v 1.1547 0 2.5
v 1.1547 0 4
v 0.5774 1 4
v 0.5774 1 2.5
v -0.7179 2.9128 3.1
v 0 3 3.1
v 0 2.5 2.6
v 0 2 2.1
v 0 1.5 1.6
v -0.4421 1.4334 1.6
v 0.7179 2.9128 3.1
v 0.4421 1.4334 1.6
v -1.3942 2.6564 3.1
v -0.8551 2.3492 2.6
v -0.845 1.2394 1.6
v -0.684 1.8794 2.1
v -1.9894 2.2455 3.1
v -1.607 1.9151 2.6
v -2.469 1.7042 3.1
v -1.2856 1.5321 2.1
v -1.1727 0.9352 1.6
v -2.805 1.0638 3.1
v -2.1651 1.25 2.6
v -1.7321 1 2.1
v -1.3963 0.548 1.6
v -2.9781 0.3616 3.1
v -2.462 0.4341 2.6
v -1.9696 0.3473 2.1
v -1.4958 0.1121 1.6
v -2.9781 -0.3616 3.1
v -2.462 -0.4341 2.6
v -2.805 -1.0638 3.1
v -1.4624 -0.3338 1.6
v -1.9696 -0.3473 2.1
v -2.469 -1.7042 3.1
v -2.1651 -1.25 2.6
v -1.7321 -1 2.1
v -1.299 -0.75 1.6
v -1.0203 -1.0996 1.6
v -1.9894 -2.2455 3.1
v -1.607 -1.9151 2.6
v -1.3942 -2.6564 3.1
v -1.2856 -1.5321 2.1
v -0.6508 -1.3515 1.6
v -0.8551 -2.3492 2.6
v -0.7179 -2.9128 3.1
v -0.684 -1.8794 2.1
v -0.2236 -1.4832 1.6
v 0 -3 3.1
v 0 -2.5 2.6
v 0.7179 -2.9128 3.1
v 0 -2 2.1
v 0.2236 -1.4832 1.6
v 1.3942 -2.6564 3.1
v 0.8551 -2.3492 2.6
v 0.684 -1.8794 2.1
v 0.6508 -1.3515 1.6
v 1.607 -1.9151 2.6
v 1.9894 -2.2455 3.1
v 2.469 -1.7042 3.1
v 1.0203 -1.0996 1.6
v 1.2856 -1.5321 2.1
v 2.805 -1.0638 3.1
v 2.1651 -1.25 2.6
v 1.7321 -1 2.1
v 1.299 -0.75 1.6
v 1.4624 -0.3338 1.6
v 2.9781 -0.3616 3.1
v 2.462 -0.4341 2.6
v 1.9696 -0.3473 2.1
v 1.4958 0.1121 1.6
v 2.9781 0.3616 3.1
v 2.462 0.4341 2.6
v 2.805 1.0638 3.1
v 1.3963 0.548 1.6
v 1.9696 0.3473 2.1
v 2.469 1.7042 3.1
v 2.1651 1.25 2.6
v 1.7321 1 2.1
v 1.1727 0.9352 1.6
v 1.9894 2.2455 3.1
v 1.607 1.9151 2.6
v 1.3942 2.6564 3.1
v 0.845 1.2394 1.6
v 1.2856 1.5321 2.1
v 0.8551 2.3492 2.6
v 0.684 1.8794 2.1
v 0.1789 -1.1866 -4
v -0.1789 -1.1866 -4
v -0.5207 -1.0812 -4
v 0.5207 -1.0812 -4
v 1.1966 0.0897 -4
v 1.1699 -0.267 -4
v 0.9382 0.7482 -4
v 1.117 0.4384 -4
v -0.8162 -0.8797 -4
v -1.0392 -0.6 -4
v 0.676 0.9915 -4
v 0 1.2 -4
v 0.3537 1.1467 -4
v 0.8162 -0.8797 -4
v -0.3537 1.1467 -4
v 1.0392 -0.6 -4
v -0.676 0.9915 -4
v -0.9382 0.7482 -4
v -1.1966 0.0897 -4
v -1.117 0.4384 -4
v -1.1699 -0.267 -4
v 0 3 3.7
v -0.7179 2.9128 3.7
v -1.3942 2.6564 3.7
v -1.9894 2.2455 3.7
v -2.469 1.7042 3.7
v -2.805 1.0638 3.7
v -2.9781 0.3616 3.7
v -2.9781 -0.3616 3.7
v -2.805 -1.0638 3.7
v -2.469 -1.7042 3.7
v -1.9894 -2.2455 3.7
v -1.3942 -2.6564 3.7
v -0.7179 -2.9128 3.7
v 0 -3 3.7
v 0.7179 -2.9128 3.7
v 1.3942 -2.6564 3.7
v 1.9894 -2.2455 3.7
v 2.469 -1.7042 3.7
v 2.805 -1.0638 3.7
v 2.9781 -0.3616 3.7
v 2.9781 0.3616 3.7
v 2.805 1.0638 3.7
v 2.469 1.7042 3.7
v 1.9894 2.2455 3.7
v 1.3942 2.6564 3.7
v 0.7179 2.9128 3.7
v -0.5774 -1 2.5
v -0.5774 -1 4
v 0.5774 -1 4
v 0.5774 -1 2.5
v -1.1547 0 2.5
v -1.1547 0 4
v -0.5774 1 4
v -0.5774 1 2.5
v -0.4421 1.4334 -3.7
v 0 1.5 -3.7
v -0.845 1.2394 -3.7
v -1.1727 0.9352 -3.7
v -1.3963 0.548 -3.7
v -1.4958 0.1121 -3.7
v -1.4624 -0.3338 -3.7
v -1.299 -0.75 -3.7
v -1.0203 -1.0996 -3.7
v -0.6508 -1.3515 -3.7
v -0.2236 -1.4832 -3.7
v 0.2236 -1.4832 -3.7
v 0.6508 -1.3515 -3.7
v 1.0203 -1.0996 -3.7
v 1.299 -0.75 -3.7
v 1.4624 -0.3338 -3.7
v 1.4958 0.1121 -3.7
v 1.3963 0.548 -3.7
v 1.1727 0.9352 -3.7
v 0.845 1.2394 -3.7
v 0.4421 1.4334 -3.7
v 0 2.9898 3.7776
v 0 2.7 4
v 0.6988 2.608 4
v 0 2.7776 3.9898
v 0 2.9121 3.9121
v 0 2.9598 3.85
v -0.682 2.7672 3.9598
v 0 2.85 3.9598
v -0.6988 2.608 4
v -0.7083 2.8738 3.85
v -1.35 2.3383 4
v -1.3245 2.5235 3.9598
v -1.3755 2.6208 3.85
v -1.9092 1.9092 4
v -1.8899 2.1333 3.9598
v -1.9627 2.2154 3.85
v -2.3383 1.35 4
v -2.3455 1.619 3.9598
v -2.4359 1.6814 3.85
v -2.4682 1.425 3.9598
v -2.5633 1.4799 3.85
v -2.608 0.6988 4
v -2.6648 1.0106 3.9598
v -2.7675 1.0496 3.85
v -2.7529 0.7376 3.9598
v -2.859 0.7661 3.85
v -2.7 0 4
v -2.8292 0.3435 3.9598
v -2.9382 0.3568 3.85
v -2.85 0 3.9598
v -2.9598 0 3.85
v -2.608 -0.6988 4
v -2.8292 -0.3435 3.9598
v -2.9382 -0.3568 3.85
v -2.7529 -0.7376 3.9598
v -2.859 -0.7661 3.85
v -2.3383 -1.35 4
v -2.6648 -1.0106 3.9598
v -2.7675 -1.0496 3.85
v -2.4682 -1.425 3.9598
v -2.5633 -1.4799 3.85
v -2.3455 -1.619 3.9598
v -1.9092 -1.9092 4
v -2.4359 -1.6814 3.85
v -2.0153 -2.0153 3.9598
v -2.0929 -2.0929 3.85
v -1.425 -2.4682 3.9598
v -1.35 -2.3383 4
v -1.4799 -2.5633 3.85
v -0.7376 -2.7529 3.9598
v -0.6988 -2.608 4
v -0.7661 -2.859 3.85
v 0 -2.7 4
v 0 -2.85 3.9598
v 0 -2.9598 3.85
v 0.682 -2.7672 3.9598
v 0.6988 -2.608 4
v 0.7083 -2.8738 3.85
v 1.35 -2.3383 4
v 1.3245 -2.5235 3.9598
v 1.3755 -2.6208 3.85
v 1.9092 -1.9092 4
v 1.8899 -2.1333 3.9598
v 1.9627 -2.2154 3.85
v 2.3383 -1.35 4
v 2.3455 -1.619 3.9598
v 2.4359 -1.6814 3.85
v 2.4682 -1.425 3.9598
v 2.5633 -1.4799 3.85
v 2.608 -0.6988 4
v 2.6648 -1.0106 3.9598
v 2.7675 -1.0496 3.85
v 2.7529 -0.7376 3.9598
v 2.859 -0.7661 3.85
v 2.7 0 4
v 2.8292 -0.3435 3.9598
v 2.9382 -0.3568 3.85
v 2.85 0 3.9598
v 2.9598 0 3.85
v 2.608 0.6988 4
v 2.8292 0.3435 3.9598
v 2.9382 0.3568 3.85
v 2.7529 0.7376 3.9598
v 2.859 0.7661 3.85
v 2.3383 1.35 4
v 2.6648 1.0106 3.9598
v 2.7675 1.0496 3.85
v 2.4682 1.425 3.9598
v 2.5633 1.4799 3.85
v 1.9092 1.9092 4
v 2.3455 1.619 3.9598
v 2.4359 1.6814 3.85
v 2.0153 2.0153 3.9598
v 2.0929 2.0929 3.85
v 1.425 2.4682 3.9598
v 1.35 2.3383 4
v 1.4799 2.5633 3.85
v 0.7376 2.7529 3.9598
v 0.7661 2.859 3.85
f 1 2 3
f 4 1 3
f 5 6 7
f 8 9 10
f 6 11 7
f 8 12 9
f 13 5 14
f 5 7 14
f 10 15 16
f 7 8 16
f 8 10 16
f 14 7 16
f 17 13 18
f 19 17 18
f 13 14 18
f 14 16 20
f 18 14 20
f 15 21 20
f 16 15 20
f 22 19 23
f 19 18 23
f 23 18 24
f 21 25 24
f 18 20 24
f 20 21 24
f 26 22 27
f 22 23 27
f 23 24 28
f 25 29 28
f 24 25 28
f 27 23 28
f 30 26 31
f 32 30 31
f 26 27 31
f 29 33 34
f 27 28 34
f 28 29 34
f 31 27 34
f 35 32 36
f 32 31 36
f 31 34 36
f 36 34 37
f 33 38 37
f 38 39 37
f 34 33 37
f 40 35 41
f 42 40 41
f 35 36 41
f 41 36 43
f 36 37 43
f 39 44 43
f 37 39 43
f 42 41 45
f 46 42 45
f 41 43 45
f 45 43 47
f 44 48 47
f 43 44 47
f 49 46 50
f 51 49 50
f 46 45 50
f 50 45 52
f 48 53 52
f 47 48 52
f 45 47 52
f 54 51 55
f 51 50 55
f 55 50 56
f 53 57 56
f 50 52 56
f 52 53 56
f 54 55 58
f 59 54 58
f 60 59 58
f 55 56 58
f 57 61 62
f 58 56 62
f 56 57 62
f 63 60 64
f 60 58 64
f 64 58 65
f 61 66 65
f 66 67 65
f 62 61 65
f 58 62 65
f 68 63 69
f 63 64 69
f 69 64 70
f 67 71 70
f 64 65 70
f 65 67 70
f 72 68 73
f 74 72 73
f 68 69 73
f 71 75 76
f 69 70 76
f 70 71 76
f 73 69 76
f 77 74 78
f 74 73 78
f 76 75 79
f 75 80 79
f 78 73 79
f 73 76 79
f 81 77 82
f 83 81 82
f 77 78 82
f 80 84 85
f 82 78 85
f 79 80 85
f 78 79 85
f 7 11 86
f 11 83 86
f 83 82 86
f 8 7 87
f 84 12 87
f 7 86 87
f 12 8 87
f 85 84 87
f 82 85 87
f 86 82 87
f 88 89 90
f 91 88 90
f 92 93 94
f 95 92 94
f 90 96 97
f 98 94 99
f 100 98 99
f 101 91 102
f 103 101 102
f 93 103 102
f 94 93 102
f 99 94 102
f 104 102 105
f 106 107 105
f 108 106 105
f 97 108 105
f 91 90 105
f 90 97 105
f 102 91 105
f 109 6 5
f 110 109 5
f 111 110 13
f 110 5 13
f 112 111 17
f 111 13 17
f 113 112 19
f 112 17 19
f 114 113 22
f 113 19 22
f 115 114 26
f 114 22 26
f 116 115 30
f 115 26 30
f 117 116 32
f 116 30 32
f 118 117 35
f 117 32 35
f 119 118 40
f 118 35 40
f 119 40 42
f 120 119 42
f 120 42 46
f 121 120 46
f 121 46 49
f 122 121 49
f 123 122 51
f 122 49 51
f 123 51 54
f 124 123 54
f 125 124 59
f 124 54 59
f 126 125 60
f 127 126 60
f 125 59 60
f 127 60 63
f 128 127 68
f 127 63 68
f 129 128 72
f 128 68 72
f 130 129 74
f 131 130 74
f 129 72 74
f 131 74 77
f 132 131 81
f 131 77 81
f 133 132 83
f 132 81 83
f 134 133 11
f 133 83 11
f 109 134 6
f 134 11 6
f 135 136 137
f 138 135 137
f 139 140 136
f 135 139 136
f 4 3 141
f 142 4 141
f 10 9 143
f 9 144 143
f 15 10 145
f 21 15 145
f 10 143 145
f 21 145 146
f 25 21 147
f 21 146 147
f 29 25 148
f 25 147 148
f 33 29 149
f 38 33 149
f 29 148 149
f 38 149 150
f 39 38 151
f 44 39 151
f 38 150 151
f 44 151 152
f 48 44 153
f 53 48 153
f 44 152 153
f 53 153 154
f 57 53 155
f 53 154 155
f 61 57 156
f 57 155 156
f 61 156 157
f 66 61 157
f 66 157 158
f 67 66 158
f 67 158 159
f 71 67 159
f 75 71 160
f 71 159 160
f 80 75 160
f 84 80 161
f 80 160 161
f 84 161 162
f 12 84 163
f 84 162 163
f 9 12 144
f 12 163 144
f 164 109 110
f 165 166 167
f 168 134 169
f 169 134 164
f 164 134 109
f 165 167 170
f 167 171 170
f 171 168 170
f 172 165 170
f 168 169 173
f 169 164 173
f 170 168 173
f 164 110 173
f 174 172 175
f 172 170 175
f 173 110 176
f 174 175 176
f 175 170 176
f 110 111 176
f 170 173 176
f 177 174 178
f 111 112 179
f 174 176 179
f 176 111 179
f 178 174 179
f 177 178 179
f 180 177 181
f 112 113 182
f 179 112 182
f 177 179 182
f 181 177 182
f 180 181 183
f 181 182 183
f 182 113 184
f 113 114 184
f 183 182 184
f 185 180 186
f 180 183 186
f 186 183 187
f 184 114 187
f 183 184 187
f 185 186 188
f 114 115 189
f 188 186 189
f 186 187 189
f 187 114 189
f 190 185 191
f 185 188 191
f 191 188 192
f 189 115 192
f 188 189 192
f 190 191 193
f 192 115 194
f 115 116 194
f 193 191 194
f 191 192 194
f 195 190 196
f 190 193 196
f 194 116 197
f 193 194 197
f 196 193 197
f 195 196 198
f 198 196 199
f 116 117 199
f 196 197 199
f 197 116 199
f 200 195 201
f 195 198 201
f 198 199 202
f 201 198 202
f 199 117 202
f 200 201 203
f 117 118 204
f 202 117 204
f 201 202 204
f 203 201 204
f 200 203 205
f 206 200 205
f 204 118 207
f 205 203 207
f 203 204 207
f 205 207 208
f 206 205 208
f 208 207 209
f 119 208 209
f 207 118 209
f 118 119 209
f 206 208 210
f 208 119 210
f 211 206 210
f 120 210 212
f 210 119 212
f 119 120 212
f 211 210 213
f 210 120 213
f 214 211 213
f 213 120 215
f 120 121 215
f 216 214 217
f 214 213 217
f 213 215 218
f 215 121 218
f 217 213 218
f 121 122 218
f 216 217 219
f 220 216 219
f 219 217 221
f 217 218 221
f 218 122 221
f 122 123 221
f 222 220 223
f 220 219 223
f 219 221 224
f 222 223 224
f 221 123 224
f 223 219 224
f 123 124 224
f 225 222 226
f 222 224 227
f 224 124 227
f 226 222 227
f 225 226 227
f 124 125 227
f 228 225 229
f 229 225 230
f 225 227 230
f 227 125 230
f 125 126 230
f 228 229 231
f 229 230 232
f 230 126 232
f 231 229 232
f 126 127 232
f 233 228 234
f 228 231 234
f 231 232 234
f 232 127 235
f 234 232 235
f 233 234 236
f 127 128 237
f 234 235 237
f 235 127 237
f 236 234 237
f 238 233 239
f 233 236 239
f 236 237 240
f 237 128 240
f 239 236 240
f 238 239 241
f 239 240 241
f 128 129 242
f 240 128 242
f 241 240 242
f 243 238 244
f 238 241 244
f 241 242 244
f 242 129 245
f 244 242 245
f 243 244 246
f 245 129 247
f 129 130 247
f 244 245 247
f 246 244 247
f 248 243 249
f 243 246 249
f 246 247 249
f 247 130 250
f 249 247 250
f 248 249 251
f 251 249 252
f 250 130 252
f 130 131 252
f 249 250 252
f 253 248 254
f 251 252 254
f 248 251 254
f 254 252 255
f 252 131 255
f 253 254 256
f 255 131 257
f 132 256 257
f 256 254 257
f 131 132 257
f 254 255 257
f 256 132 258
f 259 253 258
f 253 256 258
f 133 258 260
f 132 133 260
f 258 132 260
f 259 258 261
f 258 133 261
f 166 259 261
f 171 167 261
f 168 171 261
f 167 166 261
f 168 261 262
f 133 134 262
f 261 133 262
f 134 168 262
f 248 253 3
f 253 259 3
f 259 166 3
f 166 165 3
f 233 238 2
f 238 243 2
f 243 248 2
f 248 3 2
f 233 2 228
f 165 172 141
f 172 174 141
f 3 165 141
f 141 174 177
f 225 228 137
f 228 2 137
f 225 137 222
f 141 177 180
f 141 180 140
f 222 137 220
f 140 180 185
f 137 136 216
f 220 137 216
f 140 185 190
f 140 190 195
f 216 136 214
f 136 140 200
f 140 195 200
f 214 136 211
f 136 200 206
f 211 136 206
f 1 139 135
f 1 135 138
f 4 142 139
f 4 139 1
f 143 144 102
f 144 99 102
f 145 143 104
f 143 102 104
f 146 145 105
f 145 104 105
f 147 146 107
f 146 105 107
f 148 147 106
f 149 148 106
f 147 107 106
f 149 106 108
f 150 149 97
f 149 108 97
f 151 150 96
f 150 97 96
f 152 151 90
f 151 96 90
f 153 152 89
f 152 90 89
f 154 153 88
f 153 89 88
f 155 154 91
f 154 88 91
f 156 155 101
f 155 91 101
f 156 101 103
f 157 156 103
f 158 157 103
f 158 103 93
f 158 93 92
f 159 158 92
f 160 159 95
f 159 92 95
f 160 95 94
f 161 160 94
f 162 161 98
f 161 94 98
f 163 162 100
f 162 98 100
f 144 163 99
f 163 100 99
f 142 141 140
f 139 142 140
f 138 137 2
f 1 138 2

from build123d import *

# Parameters (mm, degrees)
CUT_EXTRUDE_1_DEPTH = 1.5
FILLET_1_R          = 0.3


with BuildPart() as part:
    # 草图1 → 旋转1 (revolve)
    with BuildSketch(Plane(origin=(0, 0, 0), x_dir=(0, 0, -1), z_dir=(1, 0, 0))):
        Polygon((-4, 0), (-4, 3), (-3.1, 3), (-1.6, 1.5), (3.7, 1.5), (4, 1.2), (4, 0), align=None)
    revolve(axis=Axis((0, 0, -4), (0, 0, 1)))

    # 草图2 → 切除-拉伸1 (cut)
    with BuildSketch(Plane.XY.offset(4)):
        Polygon((1.154700538, 0), (0.577350269, 1), (-0.577350269, 1), (-1.154700538, 0), (-0.577350269, -1), (0.577350269, -1), align=None)
    extrude(amount=-CUT_EXTRUDE_1_DEPTH, mode=Mode.SUBTRACT)

    # 圆角1
    fillet_1_edges = [part.edges().sort_by_distance(p)[0] for p in [
        (0, -3, 4),
    ]]
    fillet(fillet_1_edges, radius=FILLET_1_R)


solid = part.part
